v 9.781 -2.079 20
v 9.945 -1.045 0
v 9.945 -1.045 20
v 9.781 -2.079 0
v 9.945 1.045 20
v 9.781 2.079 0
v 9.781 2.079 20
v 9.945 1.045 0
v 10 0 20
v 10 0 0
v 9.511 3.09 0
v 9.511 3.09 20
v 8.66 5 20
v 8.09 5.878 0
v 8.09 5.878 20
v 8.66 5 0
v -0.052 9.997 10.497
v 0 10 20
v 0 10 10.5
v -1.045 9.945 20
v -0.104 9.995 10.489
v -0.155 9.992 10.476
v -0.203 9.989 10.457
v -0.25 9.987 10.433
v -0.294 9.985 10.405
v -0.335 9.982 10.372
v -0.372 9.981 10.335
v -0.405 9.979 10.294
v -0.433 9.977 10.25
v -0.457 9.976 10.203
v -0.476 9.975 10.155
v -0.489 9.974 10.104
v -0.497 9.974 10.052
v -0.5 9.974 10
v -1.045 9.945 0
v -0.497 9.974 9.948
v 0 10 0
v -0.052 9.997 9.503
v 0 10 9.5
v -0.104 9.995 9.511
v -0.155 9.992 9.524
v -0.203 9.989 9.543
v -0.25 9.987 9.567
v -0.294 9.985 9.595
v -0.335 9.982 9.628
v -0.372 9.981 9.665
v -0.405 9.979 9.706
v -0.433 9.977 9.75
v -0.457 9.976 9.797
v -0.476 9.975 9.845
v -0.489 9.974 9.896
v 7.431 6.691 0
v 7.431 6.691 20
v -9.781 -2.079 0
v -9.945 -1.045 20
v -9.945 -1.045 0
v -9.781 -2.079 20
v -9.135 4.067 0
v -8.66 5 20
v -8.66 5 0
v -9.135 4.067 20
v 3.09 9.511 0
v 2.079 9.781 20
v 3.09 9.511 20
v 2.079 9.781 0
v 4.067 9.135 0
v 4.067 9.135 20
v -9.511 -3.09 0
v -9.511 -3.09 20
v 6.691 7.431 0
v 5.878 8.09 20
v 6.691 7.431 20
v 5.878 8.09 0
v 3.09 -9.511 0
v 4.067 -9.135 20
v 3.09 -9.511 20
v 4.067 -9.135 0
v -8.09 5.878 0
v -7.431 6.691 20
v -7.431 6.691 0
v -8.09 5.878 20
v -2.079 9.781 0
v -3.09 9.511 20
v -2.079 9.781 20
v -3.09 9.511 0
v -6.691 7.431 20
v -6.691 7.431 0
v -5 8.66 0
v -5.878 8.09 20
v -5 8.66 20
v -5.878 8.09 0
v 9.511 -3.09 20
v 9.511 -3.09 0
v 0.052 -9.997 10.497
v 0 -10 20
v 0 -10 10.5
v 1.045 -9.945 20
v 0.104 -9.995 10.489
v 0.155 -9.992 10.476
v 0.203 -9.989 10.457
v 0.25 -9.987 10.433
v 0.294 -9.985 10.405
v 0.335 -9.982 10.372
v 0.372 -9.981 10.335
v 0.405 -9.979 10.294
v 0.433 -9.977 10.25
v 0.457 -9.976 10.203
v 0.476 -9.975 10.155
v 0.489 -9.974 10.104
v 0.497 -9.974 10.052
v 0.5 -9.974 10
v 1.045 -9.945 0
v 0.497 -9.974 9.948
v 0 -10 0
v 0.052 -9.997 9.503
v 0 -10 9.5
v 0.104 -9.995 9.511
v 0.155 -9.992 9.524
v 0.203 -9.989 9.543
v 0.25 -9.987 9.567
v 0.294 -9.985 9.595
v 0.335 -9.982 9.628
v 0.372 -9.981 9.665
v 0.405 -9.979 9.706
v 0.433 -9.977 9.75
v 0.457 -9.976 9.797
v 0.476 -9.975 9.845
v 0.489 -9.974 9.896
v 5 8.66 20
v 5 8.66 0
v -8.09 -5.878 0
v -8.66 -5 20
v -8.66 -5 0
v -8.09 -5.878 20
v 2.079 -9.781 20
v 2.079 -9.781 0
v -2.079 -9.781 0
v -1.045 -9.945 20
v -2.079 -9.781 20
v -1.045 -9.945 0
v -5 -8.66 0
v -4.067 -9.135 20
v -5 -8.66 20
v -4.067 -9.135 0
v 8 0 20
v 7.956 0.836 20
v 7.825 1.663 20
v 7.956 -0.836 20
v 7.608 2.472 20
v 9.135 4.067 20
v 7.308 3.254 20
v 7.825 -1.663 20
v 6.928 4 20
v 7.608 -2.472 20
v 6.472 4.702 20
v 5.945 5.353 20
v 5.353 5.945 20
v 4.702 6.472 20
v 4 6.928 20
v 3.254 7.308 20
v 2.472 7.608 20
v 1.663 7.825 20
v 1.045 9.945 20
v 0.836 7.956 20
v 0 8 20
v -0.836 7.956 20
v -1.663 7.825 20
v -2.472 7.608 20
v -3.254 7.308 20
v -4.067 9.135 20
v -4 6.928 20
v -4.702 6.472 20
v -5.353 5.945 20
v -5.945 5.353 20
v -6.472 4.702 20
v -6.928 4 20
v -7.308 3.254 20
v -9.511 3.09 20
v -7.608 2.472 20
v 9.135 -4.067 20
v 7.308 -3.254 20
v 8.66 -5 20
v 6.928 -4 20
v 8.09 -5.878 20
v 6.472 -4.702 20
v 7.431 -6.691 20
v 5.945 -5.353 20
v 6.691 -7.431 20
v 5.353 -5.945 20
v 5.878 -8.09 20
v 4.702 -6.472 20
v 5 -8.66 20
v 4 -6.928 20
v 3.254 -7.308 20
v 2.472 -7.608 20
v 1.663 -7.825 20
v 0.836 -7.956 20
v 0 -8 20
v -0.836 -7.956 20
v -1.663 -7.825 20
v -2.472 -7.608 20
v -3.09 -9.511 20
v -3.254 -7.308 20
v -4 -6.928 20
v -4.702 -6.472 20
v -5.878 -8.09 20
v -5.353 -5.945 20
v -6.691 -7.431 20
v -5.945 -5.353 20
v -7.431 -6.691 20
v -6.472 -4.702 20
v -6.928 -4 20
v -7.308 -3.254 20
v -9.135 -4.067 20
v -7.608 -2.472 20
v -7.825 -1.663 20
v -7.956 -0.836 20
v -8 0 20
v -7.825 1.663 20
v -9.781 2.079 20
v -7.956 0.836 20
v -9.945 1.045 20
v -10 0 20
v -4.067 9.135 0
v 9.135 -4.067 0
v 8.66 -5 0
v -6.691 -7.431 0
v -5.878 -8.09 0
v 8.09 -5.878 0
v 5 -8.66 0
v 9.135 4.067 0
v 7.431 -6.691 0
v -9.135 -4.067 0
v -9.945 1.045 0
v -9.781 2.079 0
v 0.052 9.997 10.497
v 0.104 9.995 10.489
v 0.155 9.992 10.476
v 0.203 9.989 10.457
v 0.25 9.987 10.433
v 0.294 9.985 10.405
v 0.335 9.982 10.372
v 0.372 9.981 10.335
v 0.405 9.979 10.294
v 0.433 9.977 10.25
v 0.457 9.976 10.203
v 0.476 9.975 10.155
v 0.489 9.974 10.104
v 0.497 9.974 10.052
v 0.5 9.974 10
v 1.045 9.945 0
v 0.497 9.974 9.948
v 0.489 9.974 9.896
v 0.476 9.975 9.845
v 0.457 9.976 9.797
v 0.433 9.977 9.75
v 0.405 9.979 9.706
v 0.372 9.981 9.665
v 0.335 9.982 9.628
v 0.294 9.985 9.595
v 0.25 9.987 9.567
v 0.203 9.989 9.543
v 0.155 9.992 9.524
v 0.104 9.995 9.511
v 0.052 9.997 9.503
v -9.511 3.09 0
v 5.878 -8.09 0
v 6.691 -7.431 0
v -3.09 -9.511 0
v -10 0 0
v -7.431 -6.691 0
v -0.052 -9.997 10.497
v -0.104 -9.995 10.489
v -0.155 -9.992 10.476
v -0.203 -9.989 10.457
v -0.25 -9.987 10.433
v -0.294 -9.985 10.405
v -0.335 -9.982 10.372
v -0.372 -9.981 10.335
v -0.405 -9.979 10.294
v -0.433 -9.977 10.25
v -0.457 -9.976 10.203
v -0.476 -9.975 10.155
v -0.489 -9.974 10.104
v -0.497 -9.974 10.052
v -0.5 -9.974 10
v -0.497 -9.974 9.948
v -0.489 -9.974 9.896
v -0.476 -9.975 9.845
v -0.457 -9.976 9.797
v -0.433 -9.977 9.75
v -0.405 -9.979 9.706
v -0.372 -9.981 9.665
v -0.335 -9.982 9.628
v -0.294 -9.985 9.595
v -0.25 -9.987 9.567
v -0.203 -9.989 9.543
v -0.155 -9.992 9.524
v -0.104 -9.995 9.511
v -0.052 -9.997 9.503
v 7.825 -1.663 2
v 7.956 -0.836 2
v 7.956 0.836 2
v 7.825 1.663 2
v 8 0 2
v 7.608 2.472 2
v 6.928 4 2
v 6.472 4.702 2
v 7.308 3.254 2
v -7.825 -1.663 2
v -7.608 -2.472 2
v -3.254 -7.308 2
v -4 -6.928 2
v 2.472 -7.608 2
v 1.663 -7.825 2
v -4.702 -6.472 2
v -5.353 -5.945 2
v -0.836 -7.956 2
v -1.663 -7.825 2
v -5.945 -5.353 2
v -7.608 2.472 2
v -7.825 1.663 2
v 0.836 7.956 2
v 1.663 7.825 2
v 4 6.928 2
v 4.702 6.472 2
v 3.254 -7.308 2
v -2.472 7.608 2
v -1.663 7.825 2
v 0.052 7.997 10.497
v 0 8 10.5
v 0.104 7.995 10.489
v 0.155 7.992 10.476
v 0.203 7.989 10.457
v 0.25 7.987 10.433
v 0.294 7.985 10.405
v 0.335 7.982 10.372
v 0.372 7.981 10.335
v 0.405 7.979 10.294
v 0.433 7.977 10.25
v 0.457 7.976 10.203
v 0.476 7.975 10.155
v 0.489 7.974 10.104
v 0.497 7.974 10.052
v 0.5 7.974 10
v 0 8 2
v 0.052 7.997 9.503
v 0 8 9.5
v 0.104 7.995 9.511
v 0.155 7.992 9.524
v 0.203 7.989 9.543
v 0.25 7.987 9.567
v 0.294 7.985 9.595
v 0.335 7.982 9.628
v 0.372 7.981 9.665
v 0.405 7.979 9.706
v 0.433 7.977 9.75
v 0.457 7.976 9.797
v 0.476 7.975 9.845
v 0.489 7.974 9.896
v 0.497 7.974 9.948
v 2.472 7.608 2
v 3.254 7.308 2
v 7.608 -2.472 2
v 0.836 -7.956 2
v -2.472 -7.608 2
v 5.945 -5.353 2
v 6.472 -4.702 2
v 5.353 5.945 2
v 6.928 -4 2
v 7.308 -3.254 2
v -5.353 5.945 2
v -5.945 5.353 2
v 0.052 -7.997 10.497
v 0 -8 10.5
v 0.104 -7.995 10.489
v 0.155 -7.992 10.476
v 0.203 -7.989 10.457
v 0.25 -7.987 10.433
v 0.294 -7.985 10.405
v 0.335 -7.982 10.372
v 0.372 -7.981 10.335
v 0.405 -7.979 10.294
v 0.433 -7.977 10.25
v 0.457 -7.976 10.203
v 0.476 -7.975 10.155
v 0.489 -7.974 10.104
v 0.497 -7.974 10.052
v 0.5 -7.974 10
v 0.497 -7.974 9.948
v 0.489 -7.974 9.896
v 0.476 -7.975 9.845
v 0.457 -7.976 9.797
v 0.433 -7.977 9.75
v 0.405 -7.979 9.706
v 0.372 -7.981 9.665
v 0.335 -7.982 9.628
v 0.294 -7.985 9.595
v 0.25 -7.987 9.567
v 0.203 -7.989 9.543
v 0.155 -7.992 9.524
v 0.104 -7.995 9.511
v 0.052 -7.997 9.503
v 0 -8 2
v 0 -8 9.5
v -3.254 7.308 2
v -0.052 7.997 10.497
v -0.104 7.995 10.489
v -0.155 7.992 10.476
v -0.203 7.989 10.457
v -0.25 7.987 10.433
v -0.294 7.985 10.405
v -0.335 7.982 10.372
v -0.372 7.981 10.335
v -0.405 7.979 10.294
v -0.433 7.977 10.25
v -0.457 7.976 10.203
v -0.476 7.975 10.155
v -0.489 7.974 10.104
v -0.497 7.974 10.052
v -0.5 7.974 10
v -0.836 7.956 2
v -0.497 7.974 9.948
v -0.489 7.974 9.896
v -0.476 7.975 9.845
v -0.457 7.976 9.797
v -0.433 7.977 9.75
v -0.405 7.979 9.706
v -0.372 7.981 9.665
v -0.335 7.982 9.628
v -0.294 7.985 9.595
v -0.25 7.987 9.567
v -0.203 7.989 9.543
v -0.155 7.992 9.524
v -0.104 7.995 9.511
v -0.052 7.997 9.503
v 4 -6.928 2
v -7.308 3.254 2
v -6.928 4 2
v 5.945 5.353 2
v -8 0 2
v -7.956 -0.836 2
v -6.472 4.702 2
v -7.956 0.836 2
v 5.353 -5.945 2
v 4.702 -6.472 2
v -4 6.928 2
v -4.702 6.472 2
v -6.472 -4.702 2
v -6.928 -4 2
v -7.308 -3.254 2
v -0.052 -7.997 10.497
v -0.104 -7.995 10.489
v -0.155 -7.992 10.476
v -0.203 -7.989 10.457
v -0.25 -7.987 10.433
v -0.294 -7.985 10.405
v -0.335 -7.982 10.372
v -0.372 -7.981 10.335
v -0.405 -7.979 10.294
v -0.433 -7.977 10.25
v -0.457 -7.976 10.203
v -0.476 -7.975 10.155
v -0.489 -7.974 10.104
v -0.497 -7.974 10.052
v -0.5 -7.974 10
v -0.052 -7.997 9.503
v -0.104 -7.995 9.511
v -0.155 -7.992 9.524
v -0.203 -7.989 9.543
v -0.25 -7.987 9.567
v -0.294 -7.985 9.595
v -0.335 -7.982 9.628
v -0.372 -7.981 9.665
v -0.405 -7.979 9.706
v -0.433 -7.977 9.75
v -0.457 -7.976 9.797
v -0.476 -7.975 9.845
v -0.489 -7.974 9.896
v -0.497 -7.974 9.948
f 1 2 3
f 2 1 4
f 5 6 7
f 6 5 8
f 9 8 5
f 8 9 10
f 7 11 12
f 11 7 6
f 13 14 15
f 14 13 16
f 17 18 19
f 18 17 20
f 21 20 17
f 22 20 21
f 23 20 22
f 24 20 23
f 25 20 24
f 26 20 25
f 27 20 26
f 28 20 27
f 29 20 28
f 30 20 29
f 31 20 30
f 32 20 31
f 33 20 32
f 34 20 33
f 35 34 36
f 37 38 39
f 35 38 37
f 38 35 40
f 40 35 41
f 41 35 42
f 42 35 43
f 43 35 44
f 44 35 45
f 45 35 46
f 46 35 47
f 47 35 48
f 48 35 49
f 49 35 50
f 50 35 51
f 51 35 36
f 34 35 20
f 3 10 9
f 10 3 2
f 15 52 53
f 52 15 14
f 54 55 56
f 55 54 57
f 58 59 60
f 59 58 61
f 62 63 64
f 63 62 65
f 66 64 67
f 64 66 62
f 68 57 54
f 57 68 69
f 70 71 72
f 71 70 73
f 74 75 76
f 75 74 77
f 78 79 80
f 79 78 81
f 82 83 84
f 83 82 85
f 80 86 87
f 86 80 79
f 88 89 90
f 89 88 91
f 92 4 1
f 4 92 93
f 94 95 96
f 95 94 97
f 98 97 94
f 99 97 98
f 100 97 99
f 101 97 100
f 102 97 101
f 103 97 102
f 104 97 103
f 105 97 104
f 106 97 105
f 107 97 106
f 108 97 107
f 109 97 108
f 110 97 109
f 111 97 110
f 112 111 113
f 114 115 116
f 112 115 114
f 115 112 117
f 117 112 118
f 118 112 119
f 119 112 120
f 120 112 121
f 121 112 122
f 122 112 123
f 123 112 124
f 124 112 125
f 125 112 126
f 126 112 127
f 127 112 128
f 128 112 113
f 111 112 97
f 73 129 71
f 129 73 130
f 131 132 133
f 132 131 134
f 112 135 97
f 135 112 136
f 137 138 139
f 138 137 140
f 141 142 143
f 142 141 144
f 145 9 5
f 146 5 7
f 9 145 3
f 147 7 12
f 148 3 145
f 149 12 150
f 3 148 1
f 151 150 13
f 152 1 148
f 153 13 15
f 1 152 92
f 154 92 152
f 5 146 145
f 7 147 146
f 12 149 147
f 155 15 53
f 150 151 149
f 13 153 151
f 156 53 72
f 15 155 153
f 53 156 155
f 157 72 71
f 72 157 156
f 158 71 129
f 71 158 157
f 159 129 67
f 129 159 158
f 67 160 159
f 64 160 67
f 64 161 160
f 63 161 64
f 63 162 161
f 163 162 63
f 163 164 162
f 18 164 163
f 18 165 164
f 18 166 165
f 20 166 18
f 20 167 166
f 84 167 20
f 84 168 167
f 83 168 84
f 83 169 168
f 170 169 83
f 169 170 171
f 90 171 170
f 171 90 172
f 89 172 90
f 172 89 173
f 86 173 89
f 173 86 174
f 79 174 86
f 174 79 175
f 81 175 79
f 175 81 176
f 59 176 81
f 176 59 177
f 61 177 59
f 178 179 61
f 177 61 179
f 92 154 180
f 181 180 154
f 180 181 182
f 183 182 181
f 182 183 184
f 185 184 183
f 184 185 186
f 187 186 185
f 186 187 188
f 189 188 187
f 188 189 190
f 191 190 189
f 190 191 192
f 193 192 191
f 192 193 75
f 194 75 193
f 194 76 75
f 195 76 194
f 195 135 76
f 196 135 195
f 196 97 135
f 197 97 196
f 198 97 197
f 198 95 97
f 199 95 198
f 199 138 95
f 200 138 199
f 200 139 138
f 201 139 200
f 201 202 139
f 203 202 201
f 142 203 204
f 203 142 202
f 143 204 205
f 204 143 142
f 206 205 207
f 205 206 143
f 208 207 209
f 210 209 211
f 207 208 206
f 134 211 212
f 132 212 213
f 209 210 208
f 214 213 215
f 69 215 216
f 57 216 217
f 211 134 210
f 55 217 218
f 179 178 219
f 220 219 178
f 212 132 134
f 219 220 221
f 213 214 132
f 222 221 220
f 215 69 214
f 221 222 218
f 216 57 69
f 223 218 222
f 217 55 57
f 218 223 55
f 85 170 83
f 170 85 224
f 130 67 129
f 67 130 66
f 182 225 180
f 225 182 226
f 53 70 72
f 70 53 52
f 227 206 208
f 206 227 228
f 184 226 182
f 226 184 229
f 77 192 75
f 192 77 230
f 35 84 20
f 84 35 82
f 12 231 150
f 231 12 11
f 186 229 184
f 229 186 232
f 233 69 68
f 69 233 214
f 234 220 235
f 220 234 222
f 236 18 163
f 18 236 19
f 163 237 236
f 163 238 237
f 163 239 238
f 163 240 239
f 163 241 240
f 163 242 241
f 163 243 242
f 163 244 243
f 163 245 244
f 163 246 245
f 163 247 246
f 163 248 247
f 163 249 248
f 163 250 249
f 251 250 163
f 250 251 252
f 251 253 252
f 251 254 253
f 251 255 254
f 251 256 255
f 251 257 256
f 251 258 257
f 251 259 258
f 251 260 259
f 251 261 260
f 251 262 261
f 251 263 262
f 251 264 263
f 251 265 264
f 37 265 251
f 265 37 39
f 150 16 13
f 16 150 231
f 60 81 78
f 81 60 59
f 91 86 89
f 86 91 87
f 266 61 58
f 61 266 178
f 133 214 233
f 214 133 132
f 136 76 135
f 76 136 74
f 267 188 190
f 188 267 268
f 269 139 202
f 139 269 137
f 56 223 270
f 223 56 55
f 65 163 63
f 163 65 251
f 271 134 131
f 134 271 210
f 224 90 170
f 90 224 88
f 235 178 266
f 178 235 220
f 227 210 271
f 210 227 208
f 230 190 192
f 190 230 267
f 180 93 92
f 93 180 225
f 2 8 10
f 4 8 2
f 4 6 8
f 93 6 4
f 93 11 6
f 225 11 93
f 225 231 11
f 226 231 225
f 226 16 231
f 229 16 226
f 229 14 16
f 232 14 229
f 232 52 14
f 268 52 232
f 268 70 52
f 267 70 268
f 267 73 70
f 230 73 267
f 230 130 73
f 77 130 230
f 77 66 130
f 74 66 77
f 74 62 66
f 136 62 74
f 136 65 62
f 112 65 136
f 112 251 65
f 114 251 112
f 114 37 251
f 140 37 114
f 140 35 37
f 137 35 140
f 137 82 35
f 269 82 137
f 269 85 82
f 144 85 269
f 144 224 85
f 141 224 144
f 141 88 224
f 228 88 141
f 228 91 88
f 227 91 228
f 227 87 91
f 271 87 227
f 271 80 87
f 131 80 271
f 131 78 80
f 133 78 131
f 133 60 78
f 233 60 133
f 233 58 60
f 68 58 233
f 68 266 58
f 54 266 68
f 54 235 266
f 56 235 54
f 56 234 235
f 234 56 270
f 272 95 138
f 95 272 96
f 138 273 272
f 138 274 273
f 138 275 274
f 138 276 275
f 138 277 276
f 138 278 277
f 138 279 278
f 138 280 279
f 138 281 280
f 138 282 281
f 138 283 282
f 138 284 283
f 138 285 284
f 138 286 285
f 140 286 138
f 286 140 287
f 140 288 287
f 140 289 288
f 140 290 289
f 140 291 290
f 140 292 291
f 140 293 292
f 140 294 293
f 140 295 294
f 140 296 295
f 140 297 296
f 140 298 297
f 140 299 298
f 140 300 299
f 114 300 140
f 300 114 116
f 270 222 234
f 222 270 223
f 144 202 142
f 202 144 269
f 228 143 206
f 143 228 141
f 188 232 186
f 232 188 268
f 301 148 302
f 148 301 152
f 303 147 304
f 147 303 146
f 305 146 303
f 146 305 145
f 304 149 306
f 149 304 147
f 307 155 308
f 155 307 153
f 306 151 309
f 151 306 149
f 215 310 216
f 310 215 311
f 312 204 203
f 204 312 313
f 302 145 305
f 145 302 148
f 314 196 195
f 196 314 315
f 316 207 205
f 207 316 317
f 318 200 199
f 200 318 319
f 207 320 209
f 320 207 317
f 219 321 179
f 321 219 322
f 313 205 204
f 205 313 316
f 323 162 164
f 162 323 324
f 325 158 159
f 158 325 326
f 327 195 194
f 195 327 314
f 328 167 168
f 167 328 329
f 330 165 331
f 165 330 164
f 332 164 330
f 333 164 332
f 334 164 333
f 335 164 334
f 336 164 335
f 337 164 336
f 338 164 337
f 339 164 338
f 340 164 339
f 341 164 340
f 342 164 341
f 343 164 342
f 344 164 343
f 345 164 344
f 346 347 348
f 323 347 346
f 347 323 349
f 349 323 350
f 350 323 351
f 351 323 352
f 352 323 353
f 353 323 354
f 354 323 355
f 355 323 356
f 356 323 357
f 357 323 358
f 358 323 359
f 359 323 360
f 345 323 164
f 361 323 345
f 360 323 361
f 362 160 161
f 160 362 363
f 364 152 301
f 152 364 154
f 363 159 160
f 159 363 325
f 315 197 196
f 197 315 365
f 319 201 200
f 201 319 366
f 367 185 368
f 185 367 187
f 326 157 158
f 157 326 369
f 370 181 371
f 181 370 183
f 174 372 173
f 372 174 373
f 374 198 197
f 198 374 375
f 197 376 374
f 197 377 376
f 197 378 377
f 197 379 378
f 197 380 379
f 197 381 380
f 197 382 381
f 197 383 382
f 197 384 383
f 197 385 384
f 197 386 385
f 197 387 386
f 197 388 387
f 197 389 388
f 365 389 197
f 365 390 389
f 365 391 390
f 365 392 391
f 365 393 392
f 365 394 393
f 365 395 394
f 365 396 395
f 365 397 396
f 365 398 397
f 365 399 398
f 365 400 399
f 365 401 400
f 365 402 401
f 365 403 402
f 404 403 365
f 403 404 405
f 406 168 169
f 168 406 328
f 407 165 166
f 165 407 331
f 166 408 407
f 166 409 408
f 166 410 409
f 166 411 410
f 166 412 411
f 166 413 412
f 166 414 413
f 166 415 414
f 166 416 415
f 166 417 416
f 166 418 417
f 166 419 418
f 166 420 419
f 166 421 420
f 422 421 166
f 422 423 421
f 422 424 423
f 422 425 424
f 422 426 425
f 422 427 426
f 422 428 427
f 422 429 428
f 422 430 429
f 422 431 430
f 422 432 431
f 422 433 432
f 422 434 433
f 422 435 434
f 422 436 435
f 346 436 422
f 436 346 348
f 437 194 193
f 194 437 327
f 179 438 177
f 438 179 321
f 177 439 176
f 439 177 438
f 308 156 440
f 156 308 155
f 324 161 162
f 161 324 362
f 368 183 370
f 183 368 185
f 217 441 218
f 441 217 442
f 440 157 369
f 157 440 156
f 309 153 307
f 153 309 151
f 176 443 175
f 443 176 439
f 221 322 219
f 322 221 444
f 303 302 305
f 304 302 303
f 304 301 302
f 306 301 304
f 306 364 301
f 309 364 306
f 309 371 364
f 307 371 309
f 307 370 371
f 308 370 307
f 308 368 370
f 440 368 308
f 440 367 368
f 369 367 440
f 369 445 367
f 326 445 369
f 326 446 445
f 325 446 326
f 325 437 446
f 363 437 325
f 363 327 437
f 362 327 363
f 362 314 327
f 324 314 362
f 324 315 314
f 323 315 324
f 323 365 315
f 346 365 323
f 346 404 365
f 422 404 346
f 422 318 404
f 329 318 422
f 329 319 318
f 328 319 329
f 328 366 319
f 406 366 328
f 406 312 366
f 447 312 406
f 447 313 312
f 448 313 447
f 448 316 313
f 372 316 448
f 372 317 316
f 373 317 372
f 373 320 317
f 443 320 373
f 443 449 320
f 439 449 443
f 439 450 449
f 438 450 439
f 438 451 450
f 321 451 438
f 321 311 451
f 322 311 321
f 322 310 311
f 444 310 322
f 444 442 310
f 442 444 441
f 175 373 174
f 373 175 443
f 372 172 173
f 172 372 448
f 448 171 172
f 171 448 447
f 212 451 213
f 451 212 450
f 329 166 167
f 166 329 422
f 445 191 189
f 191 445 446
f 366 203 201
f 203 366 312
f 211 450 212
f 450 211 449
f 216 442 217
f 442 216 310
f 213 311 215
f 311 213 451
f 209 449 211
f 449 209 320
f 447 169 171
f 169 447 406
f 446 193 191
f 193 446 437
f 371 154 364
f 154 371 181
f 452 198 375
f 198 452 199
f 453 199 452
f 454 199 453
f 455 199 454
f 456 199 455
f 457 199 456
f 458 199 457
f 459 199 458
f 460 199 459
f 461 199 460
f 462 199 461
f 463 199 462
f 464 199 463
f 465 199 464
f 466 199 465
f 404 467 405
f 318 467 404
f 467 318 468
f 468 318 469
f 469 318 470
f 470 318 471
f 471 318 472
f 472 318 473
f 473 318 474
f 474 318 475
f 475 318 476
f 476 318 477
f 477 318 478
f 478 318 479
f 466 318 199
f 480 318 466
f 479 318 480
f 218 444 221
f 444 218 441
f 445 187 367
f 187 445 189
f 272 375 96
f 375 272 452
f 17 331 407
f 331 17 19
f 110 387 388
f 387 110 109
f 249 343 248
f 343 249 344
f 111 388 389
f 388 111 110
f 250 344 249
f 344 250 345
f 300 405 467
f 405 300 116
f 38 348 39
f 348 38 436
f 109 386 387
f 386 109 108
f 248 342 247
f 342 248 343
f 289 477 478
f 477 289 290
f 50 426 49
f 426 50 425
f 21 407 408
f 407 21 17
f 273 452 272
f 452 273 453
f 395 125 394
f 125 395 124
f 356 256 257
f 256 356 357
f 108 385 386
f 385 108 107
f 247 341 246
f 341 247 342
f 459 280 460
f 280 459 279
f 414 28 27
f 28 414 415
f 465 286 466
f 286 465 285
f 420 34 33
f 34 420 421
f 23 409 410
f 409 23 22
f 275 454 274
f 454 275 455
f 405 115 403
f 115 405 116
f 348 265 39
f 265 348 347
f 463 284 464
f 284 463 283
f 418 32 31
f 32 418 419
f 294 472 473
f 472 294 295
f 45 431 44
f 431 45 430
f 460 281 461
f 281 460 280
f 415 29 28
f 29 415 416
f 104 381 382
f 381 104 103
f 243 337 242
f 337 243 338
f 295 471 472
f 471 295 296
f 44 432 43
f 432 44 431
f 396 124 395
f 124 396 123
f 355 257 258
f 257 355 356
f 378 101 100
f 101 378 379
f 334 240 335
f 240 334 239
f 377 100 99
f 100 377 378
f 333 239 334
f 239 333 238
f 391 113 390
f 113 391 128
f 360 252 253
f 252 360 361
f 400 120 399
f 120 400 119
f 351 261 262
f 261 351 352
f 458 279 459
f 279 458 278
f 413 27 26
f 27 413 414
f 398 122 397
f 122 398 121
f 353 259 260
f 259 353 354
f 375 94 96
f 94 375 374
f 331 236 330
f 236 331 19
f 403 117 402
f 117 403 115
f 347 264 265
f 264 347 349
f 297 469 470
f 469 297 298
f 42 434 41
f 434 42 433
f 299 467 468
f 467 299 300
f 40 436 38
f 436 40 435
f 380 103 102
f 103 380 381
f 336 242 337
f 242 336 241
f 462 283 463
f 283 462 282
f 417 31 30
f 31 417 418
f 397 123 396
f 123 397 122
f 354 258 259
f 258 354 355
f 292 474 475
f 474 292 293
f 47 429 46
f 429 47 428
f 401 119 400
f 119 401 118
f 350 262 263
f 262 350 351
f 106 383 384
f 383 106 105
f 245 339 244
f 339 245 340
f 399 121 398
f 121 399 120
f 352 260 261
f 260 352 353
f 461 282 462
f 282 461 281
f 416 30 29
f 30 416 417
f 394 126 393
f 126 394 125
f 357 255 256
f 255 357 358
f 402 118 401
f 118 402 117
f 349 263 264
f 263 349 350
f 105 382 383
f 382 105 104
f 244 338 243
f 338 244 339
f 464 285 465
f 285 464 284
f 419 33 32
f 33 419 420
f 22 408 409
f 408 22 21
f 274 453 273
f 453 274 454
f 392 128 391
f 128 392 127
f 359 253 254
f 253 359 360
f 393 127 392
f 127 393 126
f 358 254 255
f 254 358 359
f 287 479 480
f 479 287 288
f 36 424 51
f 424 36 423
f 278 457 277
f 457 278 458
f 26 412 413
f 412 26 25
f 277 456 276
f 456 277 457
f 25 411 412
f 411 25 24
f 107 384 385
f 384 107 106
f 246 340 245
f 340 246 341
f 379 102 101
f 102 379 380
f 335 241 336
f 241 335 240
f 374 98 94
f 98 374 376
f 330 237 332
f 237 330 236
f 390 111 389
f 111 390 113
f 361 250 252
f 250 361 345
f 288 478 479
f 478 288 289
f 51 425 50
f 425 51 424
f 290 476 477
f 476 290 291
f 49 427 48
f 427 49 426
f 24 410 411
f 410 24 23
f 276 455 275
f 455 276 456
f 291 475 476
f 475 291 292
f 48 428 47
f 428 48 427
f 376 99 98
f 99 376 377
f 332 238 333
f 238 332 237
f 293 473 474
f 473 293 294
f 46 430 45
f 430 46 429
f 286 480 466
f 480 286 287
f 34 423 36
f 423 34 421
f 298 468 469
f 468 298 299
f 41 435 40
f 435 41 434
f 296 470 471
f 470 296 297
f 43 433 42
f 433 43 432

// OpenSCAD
//Test rig to see if wires can be laid down during a print in the hole, printed over and then heated to seal the hole
//The layer height must be equivalent to the hole diameter
cupout=10;
wallt=2;
holer=0.5;
cuph=20;
$fn=60;

difference(){
    cylinder(r=cupout, h=cuph);
    translate([0,0,wallt])cylinder(r=cupout-wallt, h=cuph);
    translate([0,cupout, cuph/2])rotate([90,0,0])cylinder(r=holer, h=2*cupout); //hole for wire
}
